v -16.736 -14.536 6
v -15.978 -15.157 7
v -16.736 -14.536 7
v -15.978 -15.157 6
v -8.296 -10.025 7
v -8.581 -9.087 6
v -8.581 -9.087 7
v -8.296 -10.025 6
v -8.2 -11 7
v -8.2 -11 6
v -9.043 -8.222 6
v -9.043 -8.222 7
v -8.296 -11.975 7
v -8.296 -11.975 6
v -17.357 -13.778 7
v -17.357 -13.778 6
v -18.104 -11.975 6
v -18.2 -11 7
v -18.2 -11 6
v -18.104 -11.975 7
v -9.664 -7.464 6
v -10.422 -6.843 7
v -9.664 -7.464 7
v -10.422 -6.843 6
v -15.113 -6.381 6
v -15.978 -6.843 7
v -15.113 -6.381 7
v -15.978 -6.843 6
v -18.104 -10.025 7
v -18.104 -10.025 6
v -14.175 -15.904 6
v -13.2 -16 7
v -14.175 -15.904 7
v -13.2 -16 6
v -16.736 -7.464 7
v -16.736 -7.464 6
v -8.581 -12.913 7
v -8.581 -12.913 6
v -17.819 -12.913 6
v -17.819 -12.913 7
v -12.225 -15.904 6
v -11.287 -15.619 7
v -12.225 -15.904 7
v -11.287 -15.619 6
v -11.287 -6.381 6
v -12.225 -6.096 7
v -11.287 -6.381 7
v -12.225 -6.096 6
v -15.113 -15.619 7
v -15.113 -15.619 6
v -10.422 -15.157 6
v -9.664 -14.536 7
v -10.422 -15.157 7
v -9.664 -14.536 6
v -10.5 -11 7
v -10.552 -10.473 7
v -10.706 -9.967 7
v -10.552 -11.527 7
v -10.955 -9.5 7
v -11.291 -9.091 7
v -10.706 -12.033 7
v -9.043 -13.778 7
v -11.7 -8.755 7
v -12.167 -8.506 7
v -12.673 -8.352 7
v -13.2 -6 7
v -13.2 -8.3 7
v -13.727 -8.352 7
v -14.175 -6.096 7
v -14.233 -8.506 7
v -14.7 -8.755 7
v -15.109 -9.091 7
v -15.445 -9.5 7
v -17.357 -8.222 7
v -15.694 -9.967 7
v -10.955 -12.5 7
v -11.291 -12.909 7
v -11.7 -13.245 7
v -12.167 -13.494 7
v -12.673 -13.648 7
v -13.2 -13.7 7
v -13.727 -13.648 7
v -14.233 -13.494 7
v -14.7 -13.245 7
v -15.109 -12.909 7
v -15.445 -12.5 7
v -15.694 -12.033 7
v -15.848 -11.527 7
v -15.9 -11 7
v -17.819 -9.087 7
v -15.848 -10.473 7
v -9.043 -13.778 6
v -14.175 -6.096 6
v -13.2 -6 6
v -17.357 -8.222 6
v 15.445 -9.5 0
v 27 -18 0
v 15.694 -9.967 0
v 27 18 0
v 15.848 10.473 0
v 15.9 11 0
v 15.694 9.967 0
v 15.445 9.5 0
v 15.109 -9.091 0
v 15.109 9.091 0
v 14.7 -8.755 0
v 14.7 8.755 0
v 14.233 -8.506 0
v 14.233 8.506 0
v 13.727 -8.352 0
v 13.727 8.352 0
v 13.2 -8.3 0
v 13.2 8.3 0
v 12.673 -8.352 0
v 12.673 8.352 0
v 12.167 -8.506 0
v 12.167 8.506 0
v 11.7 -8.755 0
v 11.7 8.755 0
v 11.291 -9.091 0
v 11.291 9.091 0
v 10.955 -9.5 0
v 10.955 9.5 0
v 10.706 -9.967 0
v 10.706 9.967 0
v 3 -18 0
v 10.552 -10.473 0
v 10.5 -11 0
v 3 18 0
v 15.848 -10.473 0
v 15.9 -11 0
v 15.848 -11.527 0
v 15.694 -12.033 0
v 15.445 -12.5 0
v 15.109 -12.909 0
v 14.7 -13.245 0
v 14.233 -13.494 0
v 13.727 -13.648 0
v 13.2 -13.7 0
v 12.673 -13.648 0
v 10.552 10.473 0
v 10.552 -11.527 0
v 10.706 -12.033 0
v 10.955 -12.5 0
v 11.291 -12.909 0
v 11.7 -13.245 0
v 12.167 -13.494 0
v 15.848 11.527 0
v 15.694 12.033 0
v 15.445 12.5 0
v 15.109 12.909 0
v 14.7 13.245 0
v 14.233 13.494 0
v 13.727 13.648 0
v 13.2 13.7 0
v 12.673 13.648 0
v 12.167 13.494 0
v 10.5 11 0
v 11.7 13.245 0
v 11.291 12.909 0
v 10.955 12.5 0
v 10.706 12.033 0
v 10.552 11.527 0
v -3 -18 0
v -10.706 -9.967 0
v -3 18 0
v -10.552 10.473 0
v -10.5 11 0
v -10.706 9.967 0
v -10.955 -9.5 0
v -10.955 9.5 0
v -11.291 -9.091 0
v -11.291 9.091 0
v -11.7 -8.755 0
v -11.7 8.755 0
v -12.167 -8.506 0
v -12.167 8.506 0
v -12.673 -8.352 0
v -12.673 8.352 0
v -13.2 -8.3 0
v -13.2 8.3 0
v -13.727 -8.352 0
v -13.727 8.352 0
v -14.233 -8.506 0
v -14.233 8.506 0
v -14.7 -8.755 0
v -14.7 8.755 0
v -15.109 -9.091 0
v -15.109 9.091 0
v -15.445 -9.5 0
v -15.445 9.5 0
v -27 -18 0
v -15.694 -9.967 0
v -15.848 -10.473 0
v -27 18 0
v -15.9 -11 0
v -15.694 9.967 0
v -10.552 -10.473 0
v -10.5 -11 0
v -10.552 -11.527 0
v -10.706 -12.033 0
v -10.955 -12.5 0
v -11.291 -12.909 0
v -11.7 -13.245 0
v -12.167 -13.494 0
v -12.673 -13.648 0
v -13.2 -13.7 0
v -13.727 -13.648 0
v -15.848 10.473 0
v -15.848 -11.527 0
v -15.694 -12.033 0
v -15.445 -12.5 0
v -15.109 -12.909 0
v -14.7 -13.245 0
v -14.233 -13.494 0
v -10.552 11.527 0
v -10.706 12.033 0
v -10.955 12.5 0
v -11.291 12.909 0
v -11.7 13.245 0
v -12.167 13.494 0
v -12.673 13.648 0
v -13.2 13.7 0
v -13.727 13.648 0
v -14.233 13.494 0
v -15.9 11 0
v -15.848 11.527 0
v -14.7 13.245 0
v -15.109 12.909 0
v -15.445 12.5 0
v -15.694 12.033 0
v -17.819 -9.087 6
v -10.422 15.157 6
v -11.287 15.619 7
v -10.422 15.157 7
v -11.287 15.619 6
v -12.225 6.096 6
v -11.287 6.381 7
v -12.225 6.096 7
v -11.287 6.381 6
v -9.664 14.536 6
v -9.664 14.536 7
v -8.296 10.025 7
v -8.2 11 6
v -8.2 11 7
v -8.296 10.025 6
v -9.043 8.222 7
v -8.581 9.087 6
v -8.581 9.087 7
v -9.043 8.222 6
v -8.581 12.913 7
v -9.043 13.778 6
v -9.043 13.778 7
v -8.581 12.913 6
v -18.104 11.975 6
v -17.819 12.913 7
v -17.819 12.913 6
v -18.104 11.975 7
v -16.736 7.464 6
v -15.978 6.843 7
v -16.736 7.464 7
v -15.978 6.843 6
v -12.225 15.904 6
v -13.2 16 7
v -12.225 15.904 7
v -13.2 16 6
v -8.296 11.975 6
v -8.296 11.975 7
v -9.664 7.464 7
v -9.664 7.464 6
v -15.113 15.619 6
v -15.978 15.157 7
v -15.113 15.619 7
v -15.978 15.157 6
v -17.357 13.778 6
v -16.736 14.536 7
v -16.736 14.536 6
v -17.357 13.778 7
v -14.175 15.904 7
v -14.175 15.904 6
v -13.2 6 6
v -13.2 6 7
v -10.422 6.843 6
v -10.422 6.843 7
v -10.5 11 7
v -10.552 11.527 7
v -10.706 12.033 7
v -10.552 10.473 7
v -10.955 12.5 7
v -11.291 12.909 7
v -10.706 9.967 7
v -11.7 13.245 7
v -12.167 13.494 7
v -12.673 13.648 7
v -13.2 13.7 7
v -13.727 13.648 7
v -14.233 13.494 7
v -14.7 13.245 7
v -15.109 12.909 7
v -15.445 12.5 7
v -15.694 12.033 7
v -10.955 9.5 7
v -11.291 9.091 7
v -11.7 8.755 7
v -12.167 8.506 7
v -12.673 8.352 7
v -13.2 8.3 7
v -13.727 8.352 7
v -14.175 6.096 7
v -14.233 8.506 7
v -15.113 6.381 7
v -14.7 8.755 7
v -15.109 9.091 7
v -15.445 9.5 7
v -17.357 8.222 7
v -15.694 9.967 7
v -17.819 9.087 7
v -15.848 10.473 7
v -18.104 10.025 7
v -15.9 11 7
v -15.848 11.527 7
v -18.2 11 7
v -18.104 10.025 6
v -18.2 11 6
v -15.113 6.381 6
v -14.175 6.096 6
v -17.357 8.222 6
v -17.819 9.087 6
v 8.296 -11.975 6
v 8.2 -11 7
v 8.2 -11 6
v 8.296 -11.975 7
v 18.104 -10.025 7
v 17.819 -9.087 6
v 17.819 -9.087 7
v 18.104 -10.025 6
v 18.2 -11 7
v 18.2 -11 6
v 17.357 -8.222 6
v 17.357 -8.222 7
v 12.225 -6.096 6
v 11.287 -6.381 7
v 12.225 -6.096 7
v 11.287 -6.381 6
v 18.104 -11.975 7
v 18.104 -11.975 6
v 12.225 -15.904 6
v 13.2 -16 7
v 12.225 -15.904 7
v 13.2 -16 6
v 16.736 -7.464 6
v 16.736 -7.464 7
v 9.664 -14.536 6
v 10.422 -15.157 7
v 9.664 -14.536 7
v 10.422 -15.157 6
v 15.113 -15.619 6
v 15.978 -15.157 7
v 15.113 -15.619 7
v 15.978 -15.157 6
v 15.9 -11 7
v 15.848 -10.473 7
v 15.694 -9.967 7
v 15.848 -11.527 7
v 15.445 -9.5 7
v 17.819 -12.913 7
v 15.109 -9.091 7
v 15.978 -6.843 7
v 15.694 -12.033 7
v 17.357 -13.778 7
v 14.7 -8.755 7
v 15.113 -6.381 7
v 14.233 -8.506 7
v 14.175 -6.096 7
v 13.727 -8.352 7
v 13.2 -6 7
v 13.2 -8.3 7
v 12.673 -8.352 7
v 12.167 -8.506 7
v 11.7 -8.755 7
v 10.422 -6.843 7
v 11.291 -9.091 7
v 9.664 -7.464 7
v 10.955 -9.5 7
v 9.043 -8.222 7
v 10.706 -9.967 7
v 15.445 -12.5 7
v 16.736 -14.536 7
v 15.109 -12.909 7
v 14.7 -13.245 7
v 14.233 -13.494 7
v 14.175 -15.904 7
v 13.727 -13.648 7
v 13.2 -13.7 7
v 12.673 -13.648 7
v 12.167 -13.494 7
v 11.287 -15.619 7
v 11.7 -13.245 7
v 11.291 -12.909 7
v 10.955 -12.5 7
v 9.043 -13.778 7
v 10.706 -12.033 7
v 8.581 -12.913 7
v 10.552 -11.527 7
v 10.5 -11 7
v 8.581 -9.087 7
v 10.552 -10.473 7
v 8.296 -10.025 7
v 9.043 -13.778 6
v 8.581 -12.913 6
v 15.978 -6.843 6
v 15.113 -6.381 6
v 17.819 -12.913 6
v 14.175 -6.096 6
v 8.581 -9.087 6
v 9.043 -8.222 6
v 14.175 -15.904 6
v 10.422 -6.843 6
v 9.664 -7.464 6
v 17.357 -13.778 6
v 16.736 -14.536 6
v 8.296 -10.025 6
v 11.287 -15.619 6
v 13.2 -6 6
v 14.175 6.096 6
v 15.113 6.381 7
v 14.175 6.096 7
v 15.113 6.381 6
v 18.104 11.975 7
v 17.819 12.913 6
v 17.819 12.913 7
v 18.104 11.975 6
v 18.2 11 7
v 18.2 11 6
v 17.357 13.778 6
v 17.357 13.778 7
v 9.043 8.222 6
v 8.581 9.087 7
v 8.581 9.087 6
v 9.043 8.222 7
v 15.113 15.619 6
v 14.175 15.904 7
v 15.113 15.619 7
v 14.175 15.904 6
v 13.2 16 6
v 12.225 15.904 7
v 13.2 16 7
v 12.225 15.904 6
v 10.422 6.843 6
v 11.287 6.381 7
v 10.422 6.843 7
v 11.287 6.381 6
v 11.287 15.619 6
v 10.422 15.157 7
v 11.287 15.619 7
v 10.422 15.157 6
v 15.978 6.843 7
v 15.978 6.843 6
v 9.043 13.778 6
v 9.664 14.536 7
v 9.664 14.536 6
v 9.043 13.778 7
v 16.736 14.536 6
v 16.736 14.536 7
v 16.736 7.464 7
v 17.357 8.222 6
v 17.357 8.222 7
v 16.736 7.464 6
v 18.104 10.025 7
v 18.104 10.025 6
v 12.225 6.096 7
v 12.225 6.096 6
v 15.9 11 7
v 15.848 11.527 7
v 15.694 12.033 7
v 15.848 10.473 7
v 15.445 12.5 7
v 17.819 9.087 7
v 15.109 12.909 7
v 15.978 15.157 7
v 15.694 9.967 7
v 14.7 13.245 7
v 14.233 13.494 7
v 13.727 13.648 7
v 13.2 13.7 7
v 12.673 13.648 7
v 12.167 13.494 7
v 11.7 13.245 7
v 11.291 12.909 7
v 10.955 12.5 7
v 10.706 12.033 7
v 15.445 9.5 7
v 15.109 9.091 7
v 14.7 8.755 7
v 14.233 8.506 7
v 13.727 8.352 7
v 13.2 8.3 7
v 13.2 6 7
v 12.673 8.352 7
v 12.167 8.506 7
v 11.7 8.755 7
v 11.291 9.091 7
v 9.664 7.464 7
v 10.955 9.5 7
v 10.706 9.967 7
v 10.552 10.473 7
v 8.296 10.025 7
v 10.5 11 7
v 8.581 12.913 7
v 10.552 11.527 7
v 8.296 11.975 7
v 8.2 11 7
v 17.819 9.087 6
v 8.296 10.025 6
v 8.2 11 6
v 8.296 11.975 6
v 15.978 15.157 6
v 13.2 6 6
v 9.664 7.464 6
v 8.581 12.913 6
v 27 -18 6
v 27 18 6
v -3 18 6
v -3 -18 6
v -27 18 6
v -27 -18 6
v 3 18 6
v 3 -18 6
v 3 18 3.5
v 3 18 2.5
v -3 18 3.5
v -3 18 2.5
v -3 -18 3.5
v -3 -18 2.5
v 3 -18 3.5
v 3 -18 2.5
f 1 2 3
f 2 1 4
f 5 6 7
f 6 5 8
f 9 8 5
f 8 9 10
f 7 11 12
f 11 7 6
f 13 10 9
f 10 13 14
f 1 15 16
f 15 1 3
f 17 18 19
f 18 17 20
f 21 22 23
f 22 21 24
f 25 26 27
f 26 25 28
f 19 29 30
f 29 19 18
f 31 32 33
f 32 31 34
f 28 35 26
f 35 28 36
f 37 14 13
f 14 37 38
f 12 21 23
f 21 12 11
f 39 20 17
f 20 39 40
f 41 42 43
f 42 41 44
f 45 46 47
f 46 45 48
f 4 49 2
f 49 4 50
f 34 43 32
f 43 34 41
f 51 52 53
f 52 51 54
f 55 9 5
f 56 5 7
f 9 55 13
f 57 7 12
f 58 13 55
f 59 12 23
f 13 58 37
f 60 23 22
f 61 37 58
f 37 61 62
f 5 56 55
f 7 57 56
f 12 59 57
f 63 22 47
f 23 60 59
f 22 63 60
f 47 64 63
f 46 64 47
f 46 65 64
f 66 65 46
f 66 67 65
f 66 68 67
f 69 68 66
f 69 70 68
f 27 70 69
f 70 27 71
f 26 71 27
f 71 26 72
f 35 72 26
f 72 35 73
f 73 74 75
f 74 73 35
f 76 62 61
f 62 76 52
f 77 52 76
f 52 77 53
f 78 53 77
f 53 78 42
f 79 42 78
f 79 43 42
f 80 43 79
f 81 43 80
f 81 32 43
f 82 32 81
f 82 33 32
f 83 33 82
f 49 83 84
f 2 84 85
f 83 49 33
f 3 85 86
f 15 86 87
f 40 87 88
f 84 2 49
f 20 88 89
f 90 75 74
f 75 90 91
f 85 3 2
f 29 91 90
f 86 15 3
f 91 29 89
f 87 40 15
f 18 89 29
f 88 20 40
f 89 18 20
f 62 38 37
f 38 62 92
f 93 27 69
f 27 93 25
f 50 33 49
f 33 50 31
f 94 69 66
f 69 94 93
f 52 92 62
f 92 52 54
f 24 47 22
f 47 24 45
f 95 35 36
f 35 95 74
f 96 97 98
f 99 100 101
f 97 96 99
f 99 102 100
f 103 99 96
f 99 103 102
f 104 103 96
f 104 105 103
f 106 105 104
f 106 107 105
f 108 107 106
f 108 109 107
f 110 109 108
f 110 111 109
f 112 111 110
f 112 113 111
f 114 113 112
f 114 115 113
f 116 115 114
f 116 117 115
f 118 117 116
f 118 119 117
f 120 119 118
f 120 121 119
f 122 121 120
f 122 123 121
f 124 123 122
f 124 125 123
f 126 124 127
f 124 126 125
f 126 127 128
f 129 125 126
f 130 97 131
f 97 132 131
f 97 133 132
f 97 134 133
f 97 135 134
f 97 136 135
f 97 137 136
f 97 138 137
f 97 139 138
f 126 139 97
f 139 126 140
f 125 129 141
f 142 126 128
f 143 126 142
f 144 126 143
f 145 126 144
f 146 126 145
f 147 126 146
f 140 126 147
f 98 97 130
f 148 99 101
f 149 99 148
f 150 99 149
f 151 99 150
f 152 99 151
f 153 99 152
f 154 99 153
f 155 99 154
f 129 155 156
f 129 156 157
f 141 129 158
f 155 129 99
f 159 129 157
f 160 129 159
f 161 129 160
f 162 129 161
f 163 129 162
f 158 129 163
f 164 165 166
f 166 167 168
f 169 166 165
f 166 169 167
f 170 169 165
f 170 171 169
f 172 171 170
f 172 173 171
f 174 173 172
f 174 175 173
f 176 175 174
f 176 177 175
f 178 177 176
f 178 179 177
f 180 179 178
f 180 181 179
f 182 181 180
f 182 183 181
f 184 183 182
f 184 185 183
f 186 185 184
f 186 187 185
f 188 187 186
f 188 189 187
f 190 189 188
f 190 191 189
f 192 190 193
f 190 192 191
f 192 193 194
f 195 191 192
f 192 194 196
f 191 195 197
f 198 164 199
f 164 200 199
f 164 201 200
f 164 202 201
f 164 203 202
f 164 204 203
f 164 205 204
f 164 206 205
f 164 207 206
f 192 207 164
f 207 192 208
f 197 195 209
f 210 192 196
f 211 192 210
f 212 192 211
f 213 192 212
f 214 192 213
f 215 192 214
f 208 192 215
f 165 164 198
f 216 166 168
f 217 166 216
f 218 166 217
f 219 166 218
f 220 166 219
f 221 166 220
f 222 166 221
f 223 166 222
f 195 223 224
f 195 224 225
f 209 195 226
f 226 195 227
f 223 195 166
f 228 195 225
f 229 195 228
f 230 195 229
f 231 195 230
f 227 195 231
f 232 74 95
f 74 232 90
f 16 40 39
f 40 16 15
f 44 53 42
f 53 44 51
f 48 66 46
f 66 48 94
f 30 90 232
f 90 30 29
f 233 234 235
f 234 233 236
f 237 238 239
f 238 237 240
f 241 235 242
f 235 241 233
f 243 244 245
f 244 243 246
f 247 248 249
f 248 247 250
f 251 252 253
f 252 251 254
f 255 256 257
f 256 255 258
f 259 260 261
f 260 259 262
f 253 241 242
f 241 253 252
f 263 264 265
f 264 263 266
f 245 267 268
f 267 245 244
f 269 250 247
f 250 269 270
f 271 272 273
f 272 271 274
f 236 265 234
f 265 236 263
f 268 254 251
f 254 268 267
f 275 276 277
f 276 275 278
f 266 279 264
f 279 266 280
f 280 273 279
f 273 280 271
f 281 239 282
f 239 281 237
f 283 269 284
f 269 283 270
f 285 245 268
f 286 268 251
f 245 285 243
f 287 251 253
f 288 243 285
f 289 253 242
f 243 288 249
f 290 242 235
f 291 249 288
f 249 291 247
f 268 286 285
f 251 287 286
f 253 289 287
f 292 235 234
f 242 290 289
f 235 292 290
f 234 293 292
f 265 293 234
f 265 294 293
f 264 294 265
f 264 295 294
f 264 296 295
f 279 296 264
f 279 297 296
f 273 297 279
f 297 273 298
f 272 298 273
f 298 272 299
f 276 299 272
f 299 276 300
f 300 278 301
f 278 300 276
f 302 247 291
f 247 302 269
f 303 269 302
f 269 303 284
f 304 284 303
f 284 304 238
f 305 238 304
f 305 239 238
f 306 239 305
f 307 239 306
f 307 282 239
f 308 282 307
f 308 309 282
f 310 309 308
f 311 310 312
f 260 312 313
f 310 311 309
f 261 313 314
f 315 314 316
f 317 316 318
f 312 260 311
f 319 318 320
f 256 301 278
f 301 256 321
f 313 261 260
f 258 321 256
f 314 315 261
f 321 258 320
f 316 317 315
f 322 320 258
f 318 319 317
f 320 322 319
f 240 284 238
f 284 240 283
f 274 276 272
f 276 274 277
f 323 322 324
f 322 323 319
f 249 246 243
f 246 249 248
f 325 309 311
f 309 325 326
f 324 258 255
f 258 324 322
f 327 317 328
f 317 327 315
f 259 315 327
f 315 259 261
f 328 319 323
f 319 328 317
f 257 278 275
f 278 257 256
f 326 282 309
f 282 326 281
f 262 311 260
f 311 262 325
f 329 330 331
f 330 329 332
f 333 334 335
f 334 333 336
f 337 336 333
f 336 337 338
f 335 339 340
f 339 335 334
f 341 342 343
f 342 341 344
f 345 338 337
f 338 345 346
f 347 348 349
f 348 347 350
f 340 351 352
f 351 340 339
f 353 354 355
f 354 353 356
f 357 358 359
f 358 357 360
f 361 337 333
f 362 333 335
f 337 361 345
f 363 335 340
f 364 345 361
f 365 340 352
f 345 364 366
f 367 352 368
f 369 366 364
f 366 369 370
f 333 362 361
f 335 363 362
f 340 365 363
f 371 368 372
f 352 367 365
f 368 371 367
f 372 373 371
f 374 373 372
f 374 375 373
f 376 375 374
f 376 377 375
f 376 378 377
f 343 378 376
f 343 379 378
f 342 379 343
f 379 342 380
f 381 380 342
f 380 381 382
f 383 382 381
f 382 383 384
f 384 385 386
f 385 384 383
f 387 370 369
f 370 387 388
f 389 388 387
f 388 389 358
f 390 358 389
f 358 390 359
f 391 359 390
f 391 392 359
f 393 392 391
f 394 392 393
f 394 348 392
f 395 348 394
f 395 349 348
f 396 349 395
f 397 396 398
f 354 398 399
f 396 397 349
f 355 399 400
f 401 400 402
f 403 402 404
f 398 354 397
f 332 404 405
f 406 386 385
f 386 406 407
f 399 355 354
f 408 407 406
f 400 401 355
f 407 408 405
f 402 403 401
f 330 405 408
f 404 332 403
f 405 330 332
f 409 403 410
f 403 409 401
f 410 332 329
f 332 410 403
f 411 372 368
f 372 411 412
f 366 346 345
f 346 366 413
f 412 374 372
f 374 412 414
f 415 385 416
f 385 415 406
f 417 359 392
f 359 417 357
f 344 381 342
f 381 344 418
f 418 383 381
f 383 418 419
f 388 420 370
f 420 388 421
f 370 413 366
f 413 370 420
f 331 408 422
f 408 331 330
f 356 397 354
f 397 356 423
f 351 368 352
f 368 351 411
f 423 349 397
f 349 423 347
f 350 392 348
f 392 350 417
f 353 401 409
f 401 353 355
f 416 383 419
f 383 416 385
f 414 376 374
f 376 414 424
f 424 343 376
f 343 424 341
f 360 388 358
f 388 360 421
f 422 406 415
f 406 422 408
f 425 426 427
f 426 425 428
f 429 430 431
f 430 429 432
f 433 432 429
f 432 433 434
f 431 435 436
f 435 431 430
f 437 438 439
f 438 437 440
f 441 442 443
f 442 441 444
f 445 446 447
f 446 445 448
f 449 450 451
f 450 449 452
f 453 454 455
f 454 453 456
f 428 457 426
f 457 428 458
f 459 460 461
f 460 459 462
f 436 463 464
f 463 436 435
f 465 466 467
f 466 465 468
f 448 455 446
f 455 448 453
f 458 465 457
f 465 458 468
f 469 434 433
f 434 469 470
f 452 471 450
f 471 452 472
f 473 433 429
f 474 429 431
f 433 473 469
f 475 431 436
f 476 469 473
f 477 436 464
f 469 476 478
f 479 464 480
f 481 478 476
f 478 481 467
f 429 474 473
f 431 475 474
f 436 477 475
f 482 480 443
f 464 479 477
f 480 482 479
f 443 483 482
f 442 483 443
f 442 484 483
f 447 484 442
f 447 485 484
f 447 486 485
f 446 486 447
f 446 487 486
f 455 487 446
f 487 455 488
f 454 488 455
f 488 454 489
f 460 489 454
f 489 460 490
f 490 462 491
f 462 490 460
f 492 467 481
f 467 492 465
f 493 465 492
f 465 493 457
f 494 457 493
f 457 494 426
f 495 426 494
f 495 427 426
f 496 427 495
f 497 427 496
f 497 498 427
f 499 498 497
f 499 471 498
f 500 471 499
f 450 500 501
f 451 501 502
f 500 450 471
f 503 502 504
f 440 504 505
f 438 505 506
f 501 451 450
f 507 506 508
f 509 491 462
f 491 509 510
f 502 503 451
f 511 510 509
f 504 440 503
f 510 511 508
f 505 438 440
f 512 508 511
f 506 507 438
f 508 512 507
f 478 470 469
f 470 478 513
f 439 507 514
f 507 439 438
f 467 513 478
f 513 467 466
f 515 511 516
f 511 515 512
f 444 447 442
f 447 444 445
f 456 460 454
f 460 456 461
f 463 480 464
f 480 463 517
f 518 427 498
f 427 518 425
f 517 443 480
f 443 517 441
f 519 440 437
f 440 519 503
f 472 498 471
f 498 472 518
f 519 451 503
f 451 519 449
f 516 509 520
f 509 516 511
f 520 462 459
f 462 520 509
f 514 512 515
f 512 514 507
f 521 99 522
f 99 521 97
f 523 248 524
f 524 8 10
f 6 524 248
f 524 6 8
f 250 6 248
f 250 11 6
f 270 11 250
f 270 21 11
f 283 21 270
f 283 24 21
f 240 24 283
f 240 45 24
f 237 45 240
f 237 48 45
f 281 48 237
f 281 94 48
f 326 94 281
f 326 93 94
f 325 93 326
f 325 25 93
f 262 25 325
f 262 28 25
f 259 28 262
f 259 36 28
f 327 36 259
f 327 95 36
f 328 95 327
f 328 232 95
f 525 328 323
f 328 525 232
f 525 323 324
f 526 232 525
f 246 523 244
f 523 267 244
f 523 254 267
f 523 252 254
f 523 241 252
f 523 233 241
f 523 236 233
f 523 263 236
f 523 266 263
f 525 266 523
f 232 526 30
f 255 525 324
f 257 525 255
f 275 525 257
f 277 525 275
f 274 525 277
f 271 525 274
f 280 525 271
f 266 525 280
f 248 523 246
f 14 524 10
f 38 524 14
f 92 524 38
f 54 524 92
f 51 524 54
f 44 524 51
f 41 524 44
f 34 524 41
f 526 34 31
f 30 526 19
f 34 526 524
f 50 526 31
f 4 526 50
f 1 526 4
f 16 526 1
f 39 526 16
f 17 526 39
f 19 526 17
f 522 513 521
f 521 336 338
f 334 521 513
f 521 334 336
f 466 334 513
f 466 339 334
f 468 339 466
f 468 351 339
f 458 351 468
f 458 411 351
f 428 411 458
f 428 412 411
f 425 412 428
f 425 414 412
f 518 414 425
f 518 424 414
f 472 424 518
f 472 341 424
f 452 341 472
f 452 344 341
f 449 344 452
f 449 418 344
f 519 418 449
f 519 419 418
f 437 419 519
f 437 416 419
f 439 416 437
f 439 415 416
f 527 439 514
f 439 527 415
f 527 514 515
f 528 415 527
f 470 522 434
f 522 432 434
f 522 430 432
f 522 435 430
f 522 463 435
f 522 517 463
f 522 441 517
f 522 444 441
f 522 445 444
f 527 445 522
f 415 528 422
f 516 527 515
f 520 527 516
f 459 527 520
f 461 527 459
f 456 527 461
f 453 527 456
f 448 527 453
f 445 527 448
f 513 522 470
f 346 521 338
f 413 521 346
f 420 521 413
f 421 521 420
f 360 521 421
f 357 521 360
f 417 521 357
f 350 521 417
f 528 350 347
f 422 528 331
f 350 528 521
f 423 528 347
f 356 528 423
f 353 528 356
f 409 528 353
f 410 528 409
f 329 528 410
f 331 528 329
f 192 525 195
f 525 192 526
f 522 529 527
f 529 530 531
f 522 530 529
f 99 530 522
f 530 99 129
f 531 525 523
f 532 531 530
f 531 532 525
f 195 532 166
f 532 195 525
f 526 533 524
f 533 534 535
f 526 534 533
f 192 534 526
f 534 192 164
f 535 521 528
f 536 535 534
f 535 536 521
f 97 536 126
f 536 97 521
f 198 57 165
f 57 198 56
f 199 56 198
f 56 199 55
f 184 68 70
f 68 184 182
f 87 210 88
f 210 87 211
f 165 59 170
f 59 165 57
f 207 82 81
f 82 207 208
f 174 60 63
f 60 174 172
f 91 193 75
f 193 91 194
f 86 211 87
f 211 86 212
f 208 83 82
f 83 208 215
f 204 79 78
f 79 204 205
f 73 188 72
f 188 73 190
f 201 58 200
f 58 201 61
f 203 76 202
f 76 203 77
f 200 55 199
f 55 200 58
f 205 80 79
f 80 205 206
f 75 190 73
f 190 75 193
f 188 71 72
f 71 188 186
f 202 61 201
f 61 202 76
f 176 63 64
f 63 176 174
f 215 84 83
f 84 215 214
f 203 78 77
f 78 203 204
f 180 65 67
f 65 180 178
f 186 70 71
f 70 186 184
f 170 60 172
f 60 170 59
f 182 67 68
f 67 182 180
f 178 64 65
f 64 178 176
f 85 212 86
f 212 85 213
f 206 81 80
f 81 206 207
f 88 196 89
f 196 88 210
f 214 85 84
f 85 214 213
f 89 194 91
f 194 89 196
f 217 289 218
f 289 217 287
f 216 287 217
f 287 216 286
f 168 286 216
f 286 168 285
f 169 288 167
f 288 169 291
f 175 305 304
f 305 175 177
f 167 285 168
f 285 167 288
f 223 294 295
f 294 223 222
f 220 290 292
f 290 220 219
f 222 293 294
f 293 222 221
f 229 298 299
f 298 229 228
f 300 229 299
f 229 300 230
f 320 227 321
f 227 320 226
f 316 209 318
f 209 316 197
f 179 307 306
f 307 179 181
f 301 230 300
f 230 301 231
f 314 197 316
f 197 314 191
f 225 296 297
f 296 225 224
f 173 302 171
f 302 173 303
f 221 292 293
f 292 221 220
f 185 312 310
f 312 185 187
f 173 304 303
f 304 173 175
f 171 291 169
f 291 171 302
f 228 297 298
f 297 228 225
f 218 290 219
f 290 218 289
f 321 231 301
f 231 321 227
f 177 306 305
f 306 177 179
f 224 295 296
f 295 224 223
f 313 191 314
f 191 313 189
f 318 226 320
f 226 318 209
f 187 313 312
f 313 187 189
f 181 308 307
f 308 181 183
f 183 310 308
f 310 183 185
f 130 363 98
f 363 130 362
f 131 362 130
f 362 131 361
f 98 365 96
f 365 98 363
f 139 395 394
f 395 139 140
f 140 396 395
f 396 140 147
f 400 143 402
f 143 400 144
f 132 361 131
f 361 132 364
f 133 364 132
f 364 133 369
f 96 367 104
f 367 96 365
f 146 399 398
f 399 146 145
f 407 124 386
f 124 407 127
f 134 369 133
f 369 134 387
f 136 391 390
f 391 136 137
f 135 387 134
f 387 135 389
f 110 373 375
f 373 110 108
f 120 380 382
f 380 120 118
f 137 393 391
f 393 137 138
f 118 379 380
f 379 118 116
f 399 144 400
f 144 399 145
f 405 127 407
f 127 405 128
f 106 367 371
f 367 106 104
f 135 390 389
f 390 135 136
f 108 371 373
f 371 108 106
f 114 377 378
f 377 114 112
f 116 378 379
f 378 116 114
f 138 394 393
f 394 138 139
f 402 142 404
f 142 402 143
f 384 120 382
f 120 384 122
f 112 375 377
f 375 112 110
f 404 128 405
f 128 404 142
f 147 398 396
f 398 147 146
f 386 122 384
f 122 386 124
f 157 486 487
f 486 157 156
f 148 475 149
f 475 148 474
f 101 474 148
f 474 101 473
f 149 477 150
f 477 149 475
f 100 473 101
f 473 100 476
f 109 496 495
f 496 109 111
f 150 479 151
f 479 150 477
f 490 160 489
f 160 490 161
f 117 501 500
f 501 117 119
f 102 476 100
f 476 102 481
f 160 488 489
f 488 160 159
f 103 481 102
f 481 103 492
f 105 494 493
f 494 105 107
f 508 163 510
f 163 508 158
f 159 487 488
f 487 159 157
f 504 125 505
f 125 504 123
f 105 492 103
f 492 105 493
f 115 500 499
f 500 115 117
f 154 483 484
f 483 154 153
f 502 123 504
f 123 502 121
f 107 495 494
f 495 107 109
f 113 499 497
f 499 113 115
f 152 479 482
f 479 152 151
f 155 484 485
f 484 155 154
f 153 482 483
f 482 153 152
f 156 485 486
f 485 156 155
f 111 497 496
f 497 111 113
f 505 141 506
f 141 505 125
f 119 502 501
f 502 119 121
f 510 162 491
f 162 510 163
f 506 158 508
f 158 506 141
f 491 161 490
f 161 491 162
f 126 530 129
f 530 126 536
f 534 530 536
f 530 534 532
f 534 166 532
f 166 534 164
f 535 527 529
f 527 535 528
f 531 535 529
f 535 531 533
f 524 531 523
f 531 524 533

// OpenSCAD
$fn = 32;

// ----------------------------------------------------------------------
// Living hinge: 54 x 36 mm plates, 1 mm flexible web
// ----------------------------------------------------------------------

// --- parameters (mm) ---
plate_len = 24;           // plate length outside the web
plate_w = 36;             // plate width
thick = 6;                // plate thickness
web_half = 3;             // half width of the flex band
web_t = 1;                // flexible web thickness
web_z = 2.5;              // web position inside the thickness
boss_d = 10;              // screw boss diameter
boss_h = 7;               // screw boss height
boss_x = 13.2;            // screw boss distance from the web
screw_d = 5.4;            // screw hole

difference() {
  union() {
    /* one flat strip, later thinned at the middle */
    translate([-27, -18, 0]) cube([54, 36, 6]);
    /* screw bosses, sunk 0.5 mm into the plates */
    for (sx = [-13.2, 13.2]) {
      for (sy = [-11, 11]) {
        translate([sx, sy, 0]) cylinder(h = boss_h, d = boss_d);
      }
    }
  }
  /* channel from below: leaves the web on top of it */
  translate([-3, -20.5, -2.5]) cube([6, 41, 5]);
  /* channel from above: thins the web down to web_t */
  translate([-3, -20.5, 3.5]) cube([6, 41, 5]);
  /* screw holes through the bosses */
  for (sx = [-13.2, 13.2]) {
    for (sy = [-11, 11]) {
      translate([sx, sy, -2.5]) cylinder(h = boss_h + 5, d = screw_d);
    }
  }
}
